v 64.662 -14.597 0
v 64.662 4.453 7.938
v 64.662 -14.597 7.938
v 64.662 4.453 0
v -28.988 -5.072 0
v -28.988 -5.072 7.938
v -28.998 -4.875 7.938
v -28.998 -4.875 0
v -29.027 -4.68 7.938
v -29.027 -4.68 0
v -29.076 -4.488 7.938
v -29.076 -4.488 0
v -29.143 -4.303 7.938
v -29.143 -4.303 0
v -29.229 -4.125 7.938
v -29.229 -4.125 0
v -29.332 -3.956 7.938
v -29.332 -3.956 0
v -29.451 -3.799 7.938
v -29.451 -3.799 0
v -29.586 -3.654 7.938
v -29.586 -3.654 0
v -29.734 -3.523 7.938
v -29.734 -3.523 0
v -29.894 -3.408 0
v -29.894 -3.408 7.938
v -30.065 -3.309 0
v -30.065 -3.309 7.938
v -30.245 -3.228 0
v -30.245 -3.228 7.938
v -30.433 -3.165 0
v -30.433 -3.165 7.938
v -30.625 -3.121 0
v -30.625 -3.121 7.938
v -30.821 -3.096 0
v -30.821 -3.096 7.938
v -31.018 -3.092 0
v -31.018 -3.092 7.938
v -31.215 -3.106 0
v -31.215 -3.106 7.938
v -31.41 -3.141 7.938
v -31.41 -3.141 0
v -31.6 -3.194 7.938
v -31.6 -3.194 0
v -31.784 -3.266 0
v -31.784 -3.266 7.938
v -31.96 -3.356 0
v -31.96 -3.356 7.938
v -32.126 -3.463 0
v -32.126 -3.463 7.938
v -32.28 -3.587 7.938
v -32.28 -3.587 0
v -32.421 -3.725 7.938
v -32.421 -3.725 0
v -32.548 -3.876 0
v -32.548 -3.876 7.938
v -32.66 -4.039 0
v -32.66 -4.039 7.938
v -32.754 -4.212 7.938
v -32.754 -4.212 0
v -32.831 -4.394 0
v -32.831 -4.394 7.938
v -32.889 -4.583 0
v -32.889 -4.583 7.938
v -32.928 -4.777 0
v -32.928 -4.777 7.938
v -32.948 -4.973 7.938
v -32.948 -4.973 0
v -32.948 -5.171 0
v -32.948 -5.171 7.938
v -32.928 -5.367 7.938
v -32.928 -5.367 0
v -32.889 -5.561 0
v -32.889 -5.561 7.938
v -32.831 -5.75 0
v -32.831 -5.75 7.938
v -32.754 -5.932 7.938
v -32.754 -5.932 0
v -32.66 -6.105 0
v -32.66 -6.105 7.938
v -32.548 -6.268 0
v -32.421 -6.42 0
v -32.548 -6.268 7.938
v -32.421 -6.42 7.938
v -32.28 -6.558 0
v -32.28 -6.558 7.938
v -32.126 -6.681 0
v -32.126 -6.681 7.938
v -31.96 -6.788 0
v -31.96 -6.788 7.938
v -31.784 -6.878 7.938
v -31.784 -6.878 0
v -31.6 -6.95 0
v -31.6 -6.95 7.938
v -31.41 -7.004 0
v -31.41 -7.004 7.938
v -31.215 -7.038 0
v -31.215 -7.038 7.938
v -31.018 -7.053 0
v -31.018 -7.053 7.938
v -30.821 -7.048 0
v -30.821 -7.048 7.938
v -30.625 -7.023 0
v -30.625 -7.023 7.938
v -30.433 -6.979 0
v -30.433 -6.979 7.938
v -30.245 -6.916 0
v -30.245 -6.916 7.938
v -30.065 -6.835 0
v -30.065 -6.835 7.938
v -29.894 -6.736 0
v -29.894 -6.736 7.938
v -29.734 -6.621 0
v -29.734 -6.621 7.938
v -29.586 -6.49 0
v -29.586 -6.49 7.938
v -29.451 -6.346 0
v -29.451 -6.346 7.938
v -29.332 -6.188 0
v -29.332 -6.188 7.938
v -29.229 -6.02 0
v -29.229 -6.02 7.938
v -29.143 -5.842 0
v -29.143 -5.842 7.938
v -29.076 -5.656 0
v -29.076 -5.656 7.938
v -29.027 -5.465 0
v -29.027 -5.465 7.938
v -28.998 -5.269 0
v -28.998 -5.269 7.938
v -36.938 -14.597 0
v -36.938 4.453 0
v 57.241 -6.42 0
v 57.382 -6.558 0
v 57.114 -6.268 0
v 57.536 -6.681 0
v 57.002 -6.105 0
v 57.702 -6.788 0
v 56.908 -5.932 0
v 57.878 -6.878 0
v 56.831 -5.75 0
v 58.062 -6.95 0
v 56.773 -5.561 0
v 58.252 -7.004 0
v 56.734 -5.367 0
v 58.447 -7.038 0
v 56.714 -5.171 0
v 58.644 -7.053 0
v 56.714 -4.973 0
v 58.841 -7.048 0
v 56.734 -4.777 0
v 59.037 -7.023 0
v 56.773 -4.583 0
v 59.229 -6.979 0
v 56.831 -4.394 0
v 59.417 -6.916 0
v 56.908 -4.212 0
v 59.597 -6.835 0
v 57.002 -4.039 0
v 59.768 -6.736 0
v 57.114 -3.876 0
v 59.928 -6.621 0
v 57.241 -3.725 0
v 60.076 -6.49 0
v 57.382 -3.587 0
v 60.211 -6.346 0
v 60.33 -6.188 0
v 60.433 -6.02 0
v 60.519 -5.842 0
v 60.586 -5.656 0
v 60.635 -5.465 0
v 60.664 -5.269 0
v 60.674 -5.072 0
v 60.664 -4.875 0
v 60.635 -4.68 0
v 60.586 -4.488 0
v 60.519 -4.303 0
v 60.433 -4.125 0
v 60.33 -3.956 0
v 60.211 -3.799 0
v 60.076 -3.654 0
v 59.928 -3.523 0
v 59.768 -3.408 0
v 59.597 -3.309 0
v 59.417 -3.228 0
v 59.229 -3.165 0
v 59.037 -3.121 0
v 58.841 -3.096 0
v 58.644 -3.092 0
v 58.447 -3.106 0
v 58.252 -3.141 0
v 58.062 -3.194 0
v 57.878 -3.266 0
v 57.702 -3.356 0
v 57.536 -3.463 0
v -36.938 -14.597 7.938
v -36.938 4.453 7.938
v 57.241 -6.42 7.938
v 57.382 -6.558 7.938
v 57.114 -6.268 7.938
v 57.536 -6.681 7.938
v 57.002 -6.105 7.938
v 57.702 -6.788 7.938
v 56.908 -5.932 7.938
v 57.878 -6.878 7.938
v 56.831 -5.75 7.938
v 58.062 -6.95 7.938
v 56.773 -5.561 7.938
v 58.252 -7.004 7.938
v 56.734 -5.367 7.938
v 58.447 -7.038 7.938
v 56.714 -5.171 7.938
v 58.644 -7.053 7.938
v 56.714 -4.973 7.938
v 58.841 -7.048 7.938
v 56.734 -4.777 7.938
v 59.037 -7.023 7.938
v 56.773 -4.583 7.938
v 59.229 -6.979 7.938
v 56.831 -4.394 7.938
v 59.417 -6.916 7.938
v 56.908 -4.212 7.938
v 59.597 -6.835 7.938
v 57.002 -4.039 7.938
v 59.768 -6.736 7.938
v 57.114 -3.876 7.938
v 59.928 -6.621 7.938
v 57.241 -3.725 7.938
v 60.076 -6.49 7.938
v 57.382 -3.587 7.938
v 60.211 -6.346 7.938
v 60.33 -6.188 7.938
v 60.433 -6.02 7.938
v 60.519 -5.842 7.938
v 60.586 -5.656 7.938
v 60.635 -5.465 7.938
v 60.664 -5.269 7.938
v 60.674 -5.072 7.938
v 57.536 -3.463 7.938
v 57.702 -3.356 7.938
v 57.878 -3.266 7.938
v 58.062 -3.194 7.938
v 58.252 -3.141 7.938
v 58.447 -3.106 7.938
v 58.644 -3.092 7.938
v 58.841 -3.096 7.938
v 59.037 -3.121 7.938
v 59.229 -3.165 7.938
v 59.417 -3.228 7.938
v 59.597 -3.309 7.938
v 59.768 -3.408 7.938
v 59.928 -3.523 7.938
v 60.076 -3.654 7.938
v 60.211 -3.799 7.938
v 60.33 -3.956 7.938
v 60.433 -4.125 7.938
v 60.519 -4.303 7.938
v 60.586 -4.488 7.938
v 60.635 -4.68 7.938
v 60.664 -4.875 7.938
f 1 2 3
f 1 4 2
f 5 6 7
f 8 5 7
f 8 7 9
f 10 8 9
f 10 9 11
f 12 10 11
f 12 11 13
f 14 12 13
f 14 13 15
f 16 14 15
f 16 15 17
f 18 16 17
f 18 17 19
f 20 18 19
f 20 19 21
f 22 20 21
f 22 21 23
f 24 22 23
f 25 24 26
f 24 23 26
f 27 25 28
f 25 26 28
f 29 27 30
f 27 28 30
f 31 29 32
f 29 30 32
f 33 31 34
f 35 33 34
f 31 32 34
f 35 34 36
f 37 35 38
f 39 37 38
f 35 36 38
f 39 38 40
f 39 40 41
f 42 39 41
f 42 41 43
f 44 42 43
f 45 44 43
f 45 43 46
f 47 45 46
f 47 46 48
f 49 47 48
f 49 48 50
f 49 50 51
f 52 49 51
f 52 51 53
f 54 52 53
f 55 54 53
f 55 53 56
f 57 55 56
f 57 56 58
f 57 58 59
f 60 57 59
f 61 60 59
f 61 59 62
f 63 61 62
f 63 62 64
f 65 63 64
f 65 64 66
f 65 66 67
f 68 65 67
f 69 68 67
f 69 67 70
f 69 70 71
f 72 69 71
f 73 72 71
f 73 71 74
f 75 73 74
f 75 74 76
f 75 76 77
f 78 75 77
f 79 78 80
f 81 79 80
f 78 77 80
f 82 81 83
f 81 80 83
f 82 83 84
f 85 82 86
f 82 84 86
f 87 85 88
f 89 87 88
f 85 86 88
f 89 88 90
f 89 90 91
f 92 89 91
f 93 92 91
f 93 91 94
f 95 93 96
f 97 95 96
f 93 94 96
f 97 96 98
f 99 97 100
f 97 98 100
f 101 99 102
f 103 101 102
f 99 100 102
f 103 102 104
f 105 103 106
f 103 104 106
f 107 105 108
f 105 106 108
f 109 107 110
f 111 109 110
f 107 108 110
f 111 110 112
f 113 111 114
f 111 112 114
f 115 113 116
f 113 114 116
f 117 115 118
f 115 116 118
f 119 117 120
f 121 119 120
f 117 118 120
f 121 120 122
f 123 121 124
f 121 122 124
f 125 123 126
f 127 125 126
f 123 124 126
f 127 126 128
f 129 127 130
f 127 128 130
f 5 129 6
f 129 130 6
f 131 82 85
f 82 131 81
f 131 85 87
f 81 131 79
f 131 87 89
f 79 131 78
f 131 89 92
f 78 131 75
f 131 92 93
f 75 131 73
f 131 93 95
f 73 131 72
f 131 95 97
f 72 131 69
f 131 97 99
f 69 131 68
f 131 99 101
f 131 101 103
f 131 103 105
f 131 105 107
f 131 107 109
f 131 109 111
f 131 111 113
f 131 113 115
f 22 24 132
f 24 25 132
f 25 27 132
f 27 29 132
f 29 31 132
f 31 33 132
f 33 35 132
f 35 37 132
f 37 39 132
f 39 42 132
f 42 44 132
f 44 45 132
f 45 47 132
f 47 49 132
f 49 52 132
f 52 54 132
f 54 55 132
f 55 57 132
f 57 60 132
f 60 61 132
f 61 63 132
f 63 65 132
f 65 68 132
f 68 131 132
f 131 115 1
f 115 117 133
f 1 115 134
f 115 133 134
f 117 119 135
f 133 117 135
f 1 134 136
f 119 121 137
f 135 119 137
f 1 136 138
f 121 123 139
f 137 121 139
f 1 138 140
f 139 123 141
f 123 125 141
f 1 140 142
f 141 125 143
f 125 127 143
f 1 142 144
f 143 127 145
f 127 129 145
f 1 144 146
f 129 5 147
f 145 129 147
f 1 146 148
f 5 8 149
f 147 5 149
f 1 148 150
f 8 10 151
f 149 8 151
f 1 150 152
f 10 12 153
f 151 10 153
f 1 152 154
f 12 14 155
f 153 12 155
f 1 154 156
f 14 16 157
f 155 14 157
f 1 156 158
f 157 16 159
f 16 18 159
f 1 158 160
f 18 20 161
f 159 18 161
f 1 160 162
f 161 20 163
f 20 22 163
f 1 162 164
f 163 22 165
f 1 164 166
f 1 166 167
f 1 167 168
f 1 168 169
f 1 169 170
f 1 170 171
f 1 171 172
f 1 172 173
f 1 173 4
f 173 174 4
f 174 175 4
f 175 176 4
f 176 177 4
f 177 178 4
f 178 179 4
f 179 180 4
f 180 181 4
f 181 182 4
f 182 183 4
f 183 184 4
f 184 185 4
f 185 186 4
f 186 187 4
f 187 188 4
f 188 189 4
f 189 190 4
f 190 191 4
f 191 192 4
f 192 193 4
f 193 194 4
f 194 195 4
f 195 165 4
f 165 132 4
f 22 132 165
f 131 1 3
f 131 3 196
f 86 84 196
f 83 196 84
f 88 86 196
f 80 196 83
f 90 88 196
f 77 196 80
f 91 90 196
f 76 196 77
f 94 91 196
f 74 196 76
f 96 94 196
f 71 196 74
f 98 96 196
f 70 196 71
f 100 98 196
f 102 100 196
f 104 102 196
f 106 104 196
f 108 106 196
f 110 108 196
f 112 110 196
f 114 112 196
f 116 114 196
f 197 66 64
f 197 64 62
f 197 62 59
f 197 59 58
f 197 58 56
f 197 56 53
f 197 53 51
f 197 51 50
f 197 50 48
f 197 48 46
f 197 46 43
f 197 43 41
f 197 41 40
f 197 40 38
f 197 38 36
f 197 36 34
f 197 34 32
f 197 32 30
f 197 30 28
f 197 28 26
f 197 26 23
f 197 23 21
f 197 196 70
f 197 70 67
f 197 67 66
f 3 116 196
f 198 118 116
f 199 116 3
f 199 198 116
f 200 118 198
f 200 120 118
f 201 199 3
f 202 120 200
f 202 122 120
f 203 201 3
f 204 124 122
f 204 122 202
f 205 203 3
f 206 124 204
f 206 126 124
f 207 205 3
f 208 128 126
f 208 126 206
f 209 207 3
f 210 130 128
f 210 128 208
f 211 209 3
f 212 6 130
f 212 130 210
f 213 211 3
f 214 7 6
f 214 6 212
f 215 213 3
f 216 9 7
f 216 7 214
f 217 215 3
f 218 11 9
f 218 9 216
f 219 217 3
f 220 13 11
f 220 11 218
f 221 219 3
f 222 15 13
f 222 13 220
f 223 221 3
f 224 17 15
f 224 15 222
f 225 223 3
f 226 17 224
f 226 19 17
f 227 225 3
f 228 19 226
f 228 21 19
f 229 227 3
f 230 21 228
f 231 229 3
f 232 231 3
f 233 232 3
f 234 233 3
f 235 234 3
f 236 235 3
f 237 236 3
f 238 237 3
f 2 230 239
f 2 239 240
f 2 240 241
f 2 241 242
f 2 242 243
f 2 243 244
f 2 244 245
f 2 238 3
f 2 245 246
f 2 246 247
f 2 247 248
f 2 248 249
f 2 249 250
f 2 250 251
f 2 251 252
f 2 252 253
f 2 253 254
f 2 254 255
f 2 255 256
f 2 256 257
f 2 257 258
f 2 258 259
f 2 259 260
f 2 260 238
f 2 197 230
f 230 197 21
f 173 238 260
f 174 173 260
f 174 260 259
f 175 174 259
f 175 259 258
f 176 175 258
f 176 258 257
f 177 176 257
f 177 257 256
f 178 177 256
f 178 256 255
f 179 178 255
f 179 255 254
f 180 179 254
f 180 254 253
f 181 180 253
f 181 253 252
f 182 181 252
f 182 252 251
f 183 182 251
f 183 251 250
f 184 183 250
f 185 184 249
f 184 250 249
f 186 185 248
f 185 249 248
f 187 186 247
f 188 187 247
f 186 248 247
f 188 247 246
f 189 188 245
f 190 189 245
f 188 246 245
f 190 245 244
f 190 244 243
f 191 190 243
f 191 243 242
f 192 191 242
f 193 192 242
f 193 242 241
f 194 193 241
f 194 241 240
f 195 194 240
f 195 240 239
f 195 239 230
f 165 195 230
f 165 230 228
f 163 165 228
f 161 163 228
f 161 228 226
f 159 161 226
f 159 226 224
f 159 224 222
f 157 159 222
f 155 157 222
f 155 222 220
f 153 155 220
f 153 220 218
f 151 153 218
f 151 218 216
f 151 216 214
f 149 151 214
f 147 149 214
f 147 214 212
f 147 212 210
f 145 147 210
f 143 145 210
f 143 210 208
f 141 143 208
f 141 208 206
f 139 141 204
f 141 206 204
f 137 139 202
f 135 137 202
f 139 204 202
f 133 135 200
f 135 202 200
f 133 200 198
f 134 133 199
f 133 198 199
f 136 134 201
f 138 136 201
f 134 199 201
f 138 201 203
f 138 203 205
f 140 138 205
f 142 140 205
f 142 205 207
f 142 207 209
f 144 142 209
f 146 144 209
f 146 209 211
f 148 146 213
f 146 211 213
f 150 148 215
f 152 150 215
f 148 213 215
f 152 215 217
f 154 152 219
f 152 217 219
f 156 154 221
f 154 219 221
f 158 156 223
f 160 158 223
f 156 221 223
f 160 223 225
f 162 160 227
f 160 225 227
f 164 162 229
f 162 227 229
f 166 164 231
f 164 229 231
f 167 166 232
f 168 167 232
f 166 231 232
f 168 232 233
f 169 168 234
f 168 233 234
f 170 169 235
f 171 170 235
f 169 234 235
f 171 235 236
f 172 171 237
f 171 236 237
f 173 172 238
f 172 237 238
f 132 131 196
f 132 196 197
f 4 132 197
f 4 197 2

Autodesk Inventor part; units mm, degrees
ref_plane "YZ Plane" through (0, 0, 0) normal (1, 0, 0) x (0, 1, 0)
ref_plane "XZ Plane" through (0, 0, 0) normal (0, 1, 0) x (-1, 0, 0)
ref_plane "XY Plane" through (0, 0, 0) normal (0, 0, 1) x (1, 0, 0)
sketch "Sketch1" plane through (0, 0, 0) normal (0, 0, 1) x (1, 0, 0)
  line L0 (-36.9381, 4.4529) -> (64.6619, 4.4529)
  line L1 (64.6619, 4.4529) -> (64.6619, -14.5971)
  line L2 (64.6619, -14.5971) -> (-36.9381, -14.5971)
  line L3 (-36.9381, -14.5971) -> (-36.9381, 4.4529)
  point P0 (0, 0)
  dimension "d0" = 101.6
  dimension "d1" = 19.05
extrude "Extrusion1" add sketch "Sketch1" along normal blind 7.9375
sketch "Sketch2" plane through (0, 0, 7.9375) normal (0, 0, 1) x (1, 0, 0)
  line L0 (-36.9381, -14.5971) -> (-36.9381, 4.4529) projected
  line L1 (64.6619, -14.5971) -> (-36.9381, -14.5971) projected
  line L2 (-36.9381, -5.0721) -> (13.8619, -5.0721)
  line L3 (13.8619, -5.0721) -> (58.6929, -5.0721)
  line L4 (58.6929, -5.0721) -> (-30.9691, -5.0721)
  circle A0 centre (-30.9691, -5.0721) radius 1.9812
  circle A1 centre (58.6929, -5.0721) radius 1.9812
  point P0 (0, 0)
  dimension "d4" = 44.831
  dimension "d5" = 89.662
  dimension "d6" = 3.9624
extrude "Extrusion2" cut sketch "Sketch2" against normal blind 7.9375
properties part number "spacers"
